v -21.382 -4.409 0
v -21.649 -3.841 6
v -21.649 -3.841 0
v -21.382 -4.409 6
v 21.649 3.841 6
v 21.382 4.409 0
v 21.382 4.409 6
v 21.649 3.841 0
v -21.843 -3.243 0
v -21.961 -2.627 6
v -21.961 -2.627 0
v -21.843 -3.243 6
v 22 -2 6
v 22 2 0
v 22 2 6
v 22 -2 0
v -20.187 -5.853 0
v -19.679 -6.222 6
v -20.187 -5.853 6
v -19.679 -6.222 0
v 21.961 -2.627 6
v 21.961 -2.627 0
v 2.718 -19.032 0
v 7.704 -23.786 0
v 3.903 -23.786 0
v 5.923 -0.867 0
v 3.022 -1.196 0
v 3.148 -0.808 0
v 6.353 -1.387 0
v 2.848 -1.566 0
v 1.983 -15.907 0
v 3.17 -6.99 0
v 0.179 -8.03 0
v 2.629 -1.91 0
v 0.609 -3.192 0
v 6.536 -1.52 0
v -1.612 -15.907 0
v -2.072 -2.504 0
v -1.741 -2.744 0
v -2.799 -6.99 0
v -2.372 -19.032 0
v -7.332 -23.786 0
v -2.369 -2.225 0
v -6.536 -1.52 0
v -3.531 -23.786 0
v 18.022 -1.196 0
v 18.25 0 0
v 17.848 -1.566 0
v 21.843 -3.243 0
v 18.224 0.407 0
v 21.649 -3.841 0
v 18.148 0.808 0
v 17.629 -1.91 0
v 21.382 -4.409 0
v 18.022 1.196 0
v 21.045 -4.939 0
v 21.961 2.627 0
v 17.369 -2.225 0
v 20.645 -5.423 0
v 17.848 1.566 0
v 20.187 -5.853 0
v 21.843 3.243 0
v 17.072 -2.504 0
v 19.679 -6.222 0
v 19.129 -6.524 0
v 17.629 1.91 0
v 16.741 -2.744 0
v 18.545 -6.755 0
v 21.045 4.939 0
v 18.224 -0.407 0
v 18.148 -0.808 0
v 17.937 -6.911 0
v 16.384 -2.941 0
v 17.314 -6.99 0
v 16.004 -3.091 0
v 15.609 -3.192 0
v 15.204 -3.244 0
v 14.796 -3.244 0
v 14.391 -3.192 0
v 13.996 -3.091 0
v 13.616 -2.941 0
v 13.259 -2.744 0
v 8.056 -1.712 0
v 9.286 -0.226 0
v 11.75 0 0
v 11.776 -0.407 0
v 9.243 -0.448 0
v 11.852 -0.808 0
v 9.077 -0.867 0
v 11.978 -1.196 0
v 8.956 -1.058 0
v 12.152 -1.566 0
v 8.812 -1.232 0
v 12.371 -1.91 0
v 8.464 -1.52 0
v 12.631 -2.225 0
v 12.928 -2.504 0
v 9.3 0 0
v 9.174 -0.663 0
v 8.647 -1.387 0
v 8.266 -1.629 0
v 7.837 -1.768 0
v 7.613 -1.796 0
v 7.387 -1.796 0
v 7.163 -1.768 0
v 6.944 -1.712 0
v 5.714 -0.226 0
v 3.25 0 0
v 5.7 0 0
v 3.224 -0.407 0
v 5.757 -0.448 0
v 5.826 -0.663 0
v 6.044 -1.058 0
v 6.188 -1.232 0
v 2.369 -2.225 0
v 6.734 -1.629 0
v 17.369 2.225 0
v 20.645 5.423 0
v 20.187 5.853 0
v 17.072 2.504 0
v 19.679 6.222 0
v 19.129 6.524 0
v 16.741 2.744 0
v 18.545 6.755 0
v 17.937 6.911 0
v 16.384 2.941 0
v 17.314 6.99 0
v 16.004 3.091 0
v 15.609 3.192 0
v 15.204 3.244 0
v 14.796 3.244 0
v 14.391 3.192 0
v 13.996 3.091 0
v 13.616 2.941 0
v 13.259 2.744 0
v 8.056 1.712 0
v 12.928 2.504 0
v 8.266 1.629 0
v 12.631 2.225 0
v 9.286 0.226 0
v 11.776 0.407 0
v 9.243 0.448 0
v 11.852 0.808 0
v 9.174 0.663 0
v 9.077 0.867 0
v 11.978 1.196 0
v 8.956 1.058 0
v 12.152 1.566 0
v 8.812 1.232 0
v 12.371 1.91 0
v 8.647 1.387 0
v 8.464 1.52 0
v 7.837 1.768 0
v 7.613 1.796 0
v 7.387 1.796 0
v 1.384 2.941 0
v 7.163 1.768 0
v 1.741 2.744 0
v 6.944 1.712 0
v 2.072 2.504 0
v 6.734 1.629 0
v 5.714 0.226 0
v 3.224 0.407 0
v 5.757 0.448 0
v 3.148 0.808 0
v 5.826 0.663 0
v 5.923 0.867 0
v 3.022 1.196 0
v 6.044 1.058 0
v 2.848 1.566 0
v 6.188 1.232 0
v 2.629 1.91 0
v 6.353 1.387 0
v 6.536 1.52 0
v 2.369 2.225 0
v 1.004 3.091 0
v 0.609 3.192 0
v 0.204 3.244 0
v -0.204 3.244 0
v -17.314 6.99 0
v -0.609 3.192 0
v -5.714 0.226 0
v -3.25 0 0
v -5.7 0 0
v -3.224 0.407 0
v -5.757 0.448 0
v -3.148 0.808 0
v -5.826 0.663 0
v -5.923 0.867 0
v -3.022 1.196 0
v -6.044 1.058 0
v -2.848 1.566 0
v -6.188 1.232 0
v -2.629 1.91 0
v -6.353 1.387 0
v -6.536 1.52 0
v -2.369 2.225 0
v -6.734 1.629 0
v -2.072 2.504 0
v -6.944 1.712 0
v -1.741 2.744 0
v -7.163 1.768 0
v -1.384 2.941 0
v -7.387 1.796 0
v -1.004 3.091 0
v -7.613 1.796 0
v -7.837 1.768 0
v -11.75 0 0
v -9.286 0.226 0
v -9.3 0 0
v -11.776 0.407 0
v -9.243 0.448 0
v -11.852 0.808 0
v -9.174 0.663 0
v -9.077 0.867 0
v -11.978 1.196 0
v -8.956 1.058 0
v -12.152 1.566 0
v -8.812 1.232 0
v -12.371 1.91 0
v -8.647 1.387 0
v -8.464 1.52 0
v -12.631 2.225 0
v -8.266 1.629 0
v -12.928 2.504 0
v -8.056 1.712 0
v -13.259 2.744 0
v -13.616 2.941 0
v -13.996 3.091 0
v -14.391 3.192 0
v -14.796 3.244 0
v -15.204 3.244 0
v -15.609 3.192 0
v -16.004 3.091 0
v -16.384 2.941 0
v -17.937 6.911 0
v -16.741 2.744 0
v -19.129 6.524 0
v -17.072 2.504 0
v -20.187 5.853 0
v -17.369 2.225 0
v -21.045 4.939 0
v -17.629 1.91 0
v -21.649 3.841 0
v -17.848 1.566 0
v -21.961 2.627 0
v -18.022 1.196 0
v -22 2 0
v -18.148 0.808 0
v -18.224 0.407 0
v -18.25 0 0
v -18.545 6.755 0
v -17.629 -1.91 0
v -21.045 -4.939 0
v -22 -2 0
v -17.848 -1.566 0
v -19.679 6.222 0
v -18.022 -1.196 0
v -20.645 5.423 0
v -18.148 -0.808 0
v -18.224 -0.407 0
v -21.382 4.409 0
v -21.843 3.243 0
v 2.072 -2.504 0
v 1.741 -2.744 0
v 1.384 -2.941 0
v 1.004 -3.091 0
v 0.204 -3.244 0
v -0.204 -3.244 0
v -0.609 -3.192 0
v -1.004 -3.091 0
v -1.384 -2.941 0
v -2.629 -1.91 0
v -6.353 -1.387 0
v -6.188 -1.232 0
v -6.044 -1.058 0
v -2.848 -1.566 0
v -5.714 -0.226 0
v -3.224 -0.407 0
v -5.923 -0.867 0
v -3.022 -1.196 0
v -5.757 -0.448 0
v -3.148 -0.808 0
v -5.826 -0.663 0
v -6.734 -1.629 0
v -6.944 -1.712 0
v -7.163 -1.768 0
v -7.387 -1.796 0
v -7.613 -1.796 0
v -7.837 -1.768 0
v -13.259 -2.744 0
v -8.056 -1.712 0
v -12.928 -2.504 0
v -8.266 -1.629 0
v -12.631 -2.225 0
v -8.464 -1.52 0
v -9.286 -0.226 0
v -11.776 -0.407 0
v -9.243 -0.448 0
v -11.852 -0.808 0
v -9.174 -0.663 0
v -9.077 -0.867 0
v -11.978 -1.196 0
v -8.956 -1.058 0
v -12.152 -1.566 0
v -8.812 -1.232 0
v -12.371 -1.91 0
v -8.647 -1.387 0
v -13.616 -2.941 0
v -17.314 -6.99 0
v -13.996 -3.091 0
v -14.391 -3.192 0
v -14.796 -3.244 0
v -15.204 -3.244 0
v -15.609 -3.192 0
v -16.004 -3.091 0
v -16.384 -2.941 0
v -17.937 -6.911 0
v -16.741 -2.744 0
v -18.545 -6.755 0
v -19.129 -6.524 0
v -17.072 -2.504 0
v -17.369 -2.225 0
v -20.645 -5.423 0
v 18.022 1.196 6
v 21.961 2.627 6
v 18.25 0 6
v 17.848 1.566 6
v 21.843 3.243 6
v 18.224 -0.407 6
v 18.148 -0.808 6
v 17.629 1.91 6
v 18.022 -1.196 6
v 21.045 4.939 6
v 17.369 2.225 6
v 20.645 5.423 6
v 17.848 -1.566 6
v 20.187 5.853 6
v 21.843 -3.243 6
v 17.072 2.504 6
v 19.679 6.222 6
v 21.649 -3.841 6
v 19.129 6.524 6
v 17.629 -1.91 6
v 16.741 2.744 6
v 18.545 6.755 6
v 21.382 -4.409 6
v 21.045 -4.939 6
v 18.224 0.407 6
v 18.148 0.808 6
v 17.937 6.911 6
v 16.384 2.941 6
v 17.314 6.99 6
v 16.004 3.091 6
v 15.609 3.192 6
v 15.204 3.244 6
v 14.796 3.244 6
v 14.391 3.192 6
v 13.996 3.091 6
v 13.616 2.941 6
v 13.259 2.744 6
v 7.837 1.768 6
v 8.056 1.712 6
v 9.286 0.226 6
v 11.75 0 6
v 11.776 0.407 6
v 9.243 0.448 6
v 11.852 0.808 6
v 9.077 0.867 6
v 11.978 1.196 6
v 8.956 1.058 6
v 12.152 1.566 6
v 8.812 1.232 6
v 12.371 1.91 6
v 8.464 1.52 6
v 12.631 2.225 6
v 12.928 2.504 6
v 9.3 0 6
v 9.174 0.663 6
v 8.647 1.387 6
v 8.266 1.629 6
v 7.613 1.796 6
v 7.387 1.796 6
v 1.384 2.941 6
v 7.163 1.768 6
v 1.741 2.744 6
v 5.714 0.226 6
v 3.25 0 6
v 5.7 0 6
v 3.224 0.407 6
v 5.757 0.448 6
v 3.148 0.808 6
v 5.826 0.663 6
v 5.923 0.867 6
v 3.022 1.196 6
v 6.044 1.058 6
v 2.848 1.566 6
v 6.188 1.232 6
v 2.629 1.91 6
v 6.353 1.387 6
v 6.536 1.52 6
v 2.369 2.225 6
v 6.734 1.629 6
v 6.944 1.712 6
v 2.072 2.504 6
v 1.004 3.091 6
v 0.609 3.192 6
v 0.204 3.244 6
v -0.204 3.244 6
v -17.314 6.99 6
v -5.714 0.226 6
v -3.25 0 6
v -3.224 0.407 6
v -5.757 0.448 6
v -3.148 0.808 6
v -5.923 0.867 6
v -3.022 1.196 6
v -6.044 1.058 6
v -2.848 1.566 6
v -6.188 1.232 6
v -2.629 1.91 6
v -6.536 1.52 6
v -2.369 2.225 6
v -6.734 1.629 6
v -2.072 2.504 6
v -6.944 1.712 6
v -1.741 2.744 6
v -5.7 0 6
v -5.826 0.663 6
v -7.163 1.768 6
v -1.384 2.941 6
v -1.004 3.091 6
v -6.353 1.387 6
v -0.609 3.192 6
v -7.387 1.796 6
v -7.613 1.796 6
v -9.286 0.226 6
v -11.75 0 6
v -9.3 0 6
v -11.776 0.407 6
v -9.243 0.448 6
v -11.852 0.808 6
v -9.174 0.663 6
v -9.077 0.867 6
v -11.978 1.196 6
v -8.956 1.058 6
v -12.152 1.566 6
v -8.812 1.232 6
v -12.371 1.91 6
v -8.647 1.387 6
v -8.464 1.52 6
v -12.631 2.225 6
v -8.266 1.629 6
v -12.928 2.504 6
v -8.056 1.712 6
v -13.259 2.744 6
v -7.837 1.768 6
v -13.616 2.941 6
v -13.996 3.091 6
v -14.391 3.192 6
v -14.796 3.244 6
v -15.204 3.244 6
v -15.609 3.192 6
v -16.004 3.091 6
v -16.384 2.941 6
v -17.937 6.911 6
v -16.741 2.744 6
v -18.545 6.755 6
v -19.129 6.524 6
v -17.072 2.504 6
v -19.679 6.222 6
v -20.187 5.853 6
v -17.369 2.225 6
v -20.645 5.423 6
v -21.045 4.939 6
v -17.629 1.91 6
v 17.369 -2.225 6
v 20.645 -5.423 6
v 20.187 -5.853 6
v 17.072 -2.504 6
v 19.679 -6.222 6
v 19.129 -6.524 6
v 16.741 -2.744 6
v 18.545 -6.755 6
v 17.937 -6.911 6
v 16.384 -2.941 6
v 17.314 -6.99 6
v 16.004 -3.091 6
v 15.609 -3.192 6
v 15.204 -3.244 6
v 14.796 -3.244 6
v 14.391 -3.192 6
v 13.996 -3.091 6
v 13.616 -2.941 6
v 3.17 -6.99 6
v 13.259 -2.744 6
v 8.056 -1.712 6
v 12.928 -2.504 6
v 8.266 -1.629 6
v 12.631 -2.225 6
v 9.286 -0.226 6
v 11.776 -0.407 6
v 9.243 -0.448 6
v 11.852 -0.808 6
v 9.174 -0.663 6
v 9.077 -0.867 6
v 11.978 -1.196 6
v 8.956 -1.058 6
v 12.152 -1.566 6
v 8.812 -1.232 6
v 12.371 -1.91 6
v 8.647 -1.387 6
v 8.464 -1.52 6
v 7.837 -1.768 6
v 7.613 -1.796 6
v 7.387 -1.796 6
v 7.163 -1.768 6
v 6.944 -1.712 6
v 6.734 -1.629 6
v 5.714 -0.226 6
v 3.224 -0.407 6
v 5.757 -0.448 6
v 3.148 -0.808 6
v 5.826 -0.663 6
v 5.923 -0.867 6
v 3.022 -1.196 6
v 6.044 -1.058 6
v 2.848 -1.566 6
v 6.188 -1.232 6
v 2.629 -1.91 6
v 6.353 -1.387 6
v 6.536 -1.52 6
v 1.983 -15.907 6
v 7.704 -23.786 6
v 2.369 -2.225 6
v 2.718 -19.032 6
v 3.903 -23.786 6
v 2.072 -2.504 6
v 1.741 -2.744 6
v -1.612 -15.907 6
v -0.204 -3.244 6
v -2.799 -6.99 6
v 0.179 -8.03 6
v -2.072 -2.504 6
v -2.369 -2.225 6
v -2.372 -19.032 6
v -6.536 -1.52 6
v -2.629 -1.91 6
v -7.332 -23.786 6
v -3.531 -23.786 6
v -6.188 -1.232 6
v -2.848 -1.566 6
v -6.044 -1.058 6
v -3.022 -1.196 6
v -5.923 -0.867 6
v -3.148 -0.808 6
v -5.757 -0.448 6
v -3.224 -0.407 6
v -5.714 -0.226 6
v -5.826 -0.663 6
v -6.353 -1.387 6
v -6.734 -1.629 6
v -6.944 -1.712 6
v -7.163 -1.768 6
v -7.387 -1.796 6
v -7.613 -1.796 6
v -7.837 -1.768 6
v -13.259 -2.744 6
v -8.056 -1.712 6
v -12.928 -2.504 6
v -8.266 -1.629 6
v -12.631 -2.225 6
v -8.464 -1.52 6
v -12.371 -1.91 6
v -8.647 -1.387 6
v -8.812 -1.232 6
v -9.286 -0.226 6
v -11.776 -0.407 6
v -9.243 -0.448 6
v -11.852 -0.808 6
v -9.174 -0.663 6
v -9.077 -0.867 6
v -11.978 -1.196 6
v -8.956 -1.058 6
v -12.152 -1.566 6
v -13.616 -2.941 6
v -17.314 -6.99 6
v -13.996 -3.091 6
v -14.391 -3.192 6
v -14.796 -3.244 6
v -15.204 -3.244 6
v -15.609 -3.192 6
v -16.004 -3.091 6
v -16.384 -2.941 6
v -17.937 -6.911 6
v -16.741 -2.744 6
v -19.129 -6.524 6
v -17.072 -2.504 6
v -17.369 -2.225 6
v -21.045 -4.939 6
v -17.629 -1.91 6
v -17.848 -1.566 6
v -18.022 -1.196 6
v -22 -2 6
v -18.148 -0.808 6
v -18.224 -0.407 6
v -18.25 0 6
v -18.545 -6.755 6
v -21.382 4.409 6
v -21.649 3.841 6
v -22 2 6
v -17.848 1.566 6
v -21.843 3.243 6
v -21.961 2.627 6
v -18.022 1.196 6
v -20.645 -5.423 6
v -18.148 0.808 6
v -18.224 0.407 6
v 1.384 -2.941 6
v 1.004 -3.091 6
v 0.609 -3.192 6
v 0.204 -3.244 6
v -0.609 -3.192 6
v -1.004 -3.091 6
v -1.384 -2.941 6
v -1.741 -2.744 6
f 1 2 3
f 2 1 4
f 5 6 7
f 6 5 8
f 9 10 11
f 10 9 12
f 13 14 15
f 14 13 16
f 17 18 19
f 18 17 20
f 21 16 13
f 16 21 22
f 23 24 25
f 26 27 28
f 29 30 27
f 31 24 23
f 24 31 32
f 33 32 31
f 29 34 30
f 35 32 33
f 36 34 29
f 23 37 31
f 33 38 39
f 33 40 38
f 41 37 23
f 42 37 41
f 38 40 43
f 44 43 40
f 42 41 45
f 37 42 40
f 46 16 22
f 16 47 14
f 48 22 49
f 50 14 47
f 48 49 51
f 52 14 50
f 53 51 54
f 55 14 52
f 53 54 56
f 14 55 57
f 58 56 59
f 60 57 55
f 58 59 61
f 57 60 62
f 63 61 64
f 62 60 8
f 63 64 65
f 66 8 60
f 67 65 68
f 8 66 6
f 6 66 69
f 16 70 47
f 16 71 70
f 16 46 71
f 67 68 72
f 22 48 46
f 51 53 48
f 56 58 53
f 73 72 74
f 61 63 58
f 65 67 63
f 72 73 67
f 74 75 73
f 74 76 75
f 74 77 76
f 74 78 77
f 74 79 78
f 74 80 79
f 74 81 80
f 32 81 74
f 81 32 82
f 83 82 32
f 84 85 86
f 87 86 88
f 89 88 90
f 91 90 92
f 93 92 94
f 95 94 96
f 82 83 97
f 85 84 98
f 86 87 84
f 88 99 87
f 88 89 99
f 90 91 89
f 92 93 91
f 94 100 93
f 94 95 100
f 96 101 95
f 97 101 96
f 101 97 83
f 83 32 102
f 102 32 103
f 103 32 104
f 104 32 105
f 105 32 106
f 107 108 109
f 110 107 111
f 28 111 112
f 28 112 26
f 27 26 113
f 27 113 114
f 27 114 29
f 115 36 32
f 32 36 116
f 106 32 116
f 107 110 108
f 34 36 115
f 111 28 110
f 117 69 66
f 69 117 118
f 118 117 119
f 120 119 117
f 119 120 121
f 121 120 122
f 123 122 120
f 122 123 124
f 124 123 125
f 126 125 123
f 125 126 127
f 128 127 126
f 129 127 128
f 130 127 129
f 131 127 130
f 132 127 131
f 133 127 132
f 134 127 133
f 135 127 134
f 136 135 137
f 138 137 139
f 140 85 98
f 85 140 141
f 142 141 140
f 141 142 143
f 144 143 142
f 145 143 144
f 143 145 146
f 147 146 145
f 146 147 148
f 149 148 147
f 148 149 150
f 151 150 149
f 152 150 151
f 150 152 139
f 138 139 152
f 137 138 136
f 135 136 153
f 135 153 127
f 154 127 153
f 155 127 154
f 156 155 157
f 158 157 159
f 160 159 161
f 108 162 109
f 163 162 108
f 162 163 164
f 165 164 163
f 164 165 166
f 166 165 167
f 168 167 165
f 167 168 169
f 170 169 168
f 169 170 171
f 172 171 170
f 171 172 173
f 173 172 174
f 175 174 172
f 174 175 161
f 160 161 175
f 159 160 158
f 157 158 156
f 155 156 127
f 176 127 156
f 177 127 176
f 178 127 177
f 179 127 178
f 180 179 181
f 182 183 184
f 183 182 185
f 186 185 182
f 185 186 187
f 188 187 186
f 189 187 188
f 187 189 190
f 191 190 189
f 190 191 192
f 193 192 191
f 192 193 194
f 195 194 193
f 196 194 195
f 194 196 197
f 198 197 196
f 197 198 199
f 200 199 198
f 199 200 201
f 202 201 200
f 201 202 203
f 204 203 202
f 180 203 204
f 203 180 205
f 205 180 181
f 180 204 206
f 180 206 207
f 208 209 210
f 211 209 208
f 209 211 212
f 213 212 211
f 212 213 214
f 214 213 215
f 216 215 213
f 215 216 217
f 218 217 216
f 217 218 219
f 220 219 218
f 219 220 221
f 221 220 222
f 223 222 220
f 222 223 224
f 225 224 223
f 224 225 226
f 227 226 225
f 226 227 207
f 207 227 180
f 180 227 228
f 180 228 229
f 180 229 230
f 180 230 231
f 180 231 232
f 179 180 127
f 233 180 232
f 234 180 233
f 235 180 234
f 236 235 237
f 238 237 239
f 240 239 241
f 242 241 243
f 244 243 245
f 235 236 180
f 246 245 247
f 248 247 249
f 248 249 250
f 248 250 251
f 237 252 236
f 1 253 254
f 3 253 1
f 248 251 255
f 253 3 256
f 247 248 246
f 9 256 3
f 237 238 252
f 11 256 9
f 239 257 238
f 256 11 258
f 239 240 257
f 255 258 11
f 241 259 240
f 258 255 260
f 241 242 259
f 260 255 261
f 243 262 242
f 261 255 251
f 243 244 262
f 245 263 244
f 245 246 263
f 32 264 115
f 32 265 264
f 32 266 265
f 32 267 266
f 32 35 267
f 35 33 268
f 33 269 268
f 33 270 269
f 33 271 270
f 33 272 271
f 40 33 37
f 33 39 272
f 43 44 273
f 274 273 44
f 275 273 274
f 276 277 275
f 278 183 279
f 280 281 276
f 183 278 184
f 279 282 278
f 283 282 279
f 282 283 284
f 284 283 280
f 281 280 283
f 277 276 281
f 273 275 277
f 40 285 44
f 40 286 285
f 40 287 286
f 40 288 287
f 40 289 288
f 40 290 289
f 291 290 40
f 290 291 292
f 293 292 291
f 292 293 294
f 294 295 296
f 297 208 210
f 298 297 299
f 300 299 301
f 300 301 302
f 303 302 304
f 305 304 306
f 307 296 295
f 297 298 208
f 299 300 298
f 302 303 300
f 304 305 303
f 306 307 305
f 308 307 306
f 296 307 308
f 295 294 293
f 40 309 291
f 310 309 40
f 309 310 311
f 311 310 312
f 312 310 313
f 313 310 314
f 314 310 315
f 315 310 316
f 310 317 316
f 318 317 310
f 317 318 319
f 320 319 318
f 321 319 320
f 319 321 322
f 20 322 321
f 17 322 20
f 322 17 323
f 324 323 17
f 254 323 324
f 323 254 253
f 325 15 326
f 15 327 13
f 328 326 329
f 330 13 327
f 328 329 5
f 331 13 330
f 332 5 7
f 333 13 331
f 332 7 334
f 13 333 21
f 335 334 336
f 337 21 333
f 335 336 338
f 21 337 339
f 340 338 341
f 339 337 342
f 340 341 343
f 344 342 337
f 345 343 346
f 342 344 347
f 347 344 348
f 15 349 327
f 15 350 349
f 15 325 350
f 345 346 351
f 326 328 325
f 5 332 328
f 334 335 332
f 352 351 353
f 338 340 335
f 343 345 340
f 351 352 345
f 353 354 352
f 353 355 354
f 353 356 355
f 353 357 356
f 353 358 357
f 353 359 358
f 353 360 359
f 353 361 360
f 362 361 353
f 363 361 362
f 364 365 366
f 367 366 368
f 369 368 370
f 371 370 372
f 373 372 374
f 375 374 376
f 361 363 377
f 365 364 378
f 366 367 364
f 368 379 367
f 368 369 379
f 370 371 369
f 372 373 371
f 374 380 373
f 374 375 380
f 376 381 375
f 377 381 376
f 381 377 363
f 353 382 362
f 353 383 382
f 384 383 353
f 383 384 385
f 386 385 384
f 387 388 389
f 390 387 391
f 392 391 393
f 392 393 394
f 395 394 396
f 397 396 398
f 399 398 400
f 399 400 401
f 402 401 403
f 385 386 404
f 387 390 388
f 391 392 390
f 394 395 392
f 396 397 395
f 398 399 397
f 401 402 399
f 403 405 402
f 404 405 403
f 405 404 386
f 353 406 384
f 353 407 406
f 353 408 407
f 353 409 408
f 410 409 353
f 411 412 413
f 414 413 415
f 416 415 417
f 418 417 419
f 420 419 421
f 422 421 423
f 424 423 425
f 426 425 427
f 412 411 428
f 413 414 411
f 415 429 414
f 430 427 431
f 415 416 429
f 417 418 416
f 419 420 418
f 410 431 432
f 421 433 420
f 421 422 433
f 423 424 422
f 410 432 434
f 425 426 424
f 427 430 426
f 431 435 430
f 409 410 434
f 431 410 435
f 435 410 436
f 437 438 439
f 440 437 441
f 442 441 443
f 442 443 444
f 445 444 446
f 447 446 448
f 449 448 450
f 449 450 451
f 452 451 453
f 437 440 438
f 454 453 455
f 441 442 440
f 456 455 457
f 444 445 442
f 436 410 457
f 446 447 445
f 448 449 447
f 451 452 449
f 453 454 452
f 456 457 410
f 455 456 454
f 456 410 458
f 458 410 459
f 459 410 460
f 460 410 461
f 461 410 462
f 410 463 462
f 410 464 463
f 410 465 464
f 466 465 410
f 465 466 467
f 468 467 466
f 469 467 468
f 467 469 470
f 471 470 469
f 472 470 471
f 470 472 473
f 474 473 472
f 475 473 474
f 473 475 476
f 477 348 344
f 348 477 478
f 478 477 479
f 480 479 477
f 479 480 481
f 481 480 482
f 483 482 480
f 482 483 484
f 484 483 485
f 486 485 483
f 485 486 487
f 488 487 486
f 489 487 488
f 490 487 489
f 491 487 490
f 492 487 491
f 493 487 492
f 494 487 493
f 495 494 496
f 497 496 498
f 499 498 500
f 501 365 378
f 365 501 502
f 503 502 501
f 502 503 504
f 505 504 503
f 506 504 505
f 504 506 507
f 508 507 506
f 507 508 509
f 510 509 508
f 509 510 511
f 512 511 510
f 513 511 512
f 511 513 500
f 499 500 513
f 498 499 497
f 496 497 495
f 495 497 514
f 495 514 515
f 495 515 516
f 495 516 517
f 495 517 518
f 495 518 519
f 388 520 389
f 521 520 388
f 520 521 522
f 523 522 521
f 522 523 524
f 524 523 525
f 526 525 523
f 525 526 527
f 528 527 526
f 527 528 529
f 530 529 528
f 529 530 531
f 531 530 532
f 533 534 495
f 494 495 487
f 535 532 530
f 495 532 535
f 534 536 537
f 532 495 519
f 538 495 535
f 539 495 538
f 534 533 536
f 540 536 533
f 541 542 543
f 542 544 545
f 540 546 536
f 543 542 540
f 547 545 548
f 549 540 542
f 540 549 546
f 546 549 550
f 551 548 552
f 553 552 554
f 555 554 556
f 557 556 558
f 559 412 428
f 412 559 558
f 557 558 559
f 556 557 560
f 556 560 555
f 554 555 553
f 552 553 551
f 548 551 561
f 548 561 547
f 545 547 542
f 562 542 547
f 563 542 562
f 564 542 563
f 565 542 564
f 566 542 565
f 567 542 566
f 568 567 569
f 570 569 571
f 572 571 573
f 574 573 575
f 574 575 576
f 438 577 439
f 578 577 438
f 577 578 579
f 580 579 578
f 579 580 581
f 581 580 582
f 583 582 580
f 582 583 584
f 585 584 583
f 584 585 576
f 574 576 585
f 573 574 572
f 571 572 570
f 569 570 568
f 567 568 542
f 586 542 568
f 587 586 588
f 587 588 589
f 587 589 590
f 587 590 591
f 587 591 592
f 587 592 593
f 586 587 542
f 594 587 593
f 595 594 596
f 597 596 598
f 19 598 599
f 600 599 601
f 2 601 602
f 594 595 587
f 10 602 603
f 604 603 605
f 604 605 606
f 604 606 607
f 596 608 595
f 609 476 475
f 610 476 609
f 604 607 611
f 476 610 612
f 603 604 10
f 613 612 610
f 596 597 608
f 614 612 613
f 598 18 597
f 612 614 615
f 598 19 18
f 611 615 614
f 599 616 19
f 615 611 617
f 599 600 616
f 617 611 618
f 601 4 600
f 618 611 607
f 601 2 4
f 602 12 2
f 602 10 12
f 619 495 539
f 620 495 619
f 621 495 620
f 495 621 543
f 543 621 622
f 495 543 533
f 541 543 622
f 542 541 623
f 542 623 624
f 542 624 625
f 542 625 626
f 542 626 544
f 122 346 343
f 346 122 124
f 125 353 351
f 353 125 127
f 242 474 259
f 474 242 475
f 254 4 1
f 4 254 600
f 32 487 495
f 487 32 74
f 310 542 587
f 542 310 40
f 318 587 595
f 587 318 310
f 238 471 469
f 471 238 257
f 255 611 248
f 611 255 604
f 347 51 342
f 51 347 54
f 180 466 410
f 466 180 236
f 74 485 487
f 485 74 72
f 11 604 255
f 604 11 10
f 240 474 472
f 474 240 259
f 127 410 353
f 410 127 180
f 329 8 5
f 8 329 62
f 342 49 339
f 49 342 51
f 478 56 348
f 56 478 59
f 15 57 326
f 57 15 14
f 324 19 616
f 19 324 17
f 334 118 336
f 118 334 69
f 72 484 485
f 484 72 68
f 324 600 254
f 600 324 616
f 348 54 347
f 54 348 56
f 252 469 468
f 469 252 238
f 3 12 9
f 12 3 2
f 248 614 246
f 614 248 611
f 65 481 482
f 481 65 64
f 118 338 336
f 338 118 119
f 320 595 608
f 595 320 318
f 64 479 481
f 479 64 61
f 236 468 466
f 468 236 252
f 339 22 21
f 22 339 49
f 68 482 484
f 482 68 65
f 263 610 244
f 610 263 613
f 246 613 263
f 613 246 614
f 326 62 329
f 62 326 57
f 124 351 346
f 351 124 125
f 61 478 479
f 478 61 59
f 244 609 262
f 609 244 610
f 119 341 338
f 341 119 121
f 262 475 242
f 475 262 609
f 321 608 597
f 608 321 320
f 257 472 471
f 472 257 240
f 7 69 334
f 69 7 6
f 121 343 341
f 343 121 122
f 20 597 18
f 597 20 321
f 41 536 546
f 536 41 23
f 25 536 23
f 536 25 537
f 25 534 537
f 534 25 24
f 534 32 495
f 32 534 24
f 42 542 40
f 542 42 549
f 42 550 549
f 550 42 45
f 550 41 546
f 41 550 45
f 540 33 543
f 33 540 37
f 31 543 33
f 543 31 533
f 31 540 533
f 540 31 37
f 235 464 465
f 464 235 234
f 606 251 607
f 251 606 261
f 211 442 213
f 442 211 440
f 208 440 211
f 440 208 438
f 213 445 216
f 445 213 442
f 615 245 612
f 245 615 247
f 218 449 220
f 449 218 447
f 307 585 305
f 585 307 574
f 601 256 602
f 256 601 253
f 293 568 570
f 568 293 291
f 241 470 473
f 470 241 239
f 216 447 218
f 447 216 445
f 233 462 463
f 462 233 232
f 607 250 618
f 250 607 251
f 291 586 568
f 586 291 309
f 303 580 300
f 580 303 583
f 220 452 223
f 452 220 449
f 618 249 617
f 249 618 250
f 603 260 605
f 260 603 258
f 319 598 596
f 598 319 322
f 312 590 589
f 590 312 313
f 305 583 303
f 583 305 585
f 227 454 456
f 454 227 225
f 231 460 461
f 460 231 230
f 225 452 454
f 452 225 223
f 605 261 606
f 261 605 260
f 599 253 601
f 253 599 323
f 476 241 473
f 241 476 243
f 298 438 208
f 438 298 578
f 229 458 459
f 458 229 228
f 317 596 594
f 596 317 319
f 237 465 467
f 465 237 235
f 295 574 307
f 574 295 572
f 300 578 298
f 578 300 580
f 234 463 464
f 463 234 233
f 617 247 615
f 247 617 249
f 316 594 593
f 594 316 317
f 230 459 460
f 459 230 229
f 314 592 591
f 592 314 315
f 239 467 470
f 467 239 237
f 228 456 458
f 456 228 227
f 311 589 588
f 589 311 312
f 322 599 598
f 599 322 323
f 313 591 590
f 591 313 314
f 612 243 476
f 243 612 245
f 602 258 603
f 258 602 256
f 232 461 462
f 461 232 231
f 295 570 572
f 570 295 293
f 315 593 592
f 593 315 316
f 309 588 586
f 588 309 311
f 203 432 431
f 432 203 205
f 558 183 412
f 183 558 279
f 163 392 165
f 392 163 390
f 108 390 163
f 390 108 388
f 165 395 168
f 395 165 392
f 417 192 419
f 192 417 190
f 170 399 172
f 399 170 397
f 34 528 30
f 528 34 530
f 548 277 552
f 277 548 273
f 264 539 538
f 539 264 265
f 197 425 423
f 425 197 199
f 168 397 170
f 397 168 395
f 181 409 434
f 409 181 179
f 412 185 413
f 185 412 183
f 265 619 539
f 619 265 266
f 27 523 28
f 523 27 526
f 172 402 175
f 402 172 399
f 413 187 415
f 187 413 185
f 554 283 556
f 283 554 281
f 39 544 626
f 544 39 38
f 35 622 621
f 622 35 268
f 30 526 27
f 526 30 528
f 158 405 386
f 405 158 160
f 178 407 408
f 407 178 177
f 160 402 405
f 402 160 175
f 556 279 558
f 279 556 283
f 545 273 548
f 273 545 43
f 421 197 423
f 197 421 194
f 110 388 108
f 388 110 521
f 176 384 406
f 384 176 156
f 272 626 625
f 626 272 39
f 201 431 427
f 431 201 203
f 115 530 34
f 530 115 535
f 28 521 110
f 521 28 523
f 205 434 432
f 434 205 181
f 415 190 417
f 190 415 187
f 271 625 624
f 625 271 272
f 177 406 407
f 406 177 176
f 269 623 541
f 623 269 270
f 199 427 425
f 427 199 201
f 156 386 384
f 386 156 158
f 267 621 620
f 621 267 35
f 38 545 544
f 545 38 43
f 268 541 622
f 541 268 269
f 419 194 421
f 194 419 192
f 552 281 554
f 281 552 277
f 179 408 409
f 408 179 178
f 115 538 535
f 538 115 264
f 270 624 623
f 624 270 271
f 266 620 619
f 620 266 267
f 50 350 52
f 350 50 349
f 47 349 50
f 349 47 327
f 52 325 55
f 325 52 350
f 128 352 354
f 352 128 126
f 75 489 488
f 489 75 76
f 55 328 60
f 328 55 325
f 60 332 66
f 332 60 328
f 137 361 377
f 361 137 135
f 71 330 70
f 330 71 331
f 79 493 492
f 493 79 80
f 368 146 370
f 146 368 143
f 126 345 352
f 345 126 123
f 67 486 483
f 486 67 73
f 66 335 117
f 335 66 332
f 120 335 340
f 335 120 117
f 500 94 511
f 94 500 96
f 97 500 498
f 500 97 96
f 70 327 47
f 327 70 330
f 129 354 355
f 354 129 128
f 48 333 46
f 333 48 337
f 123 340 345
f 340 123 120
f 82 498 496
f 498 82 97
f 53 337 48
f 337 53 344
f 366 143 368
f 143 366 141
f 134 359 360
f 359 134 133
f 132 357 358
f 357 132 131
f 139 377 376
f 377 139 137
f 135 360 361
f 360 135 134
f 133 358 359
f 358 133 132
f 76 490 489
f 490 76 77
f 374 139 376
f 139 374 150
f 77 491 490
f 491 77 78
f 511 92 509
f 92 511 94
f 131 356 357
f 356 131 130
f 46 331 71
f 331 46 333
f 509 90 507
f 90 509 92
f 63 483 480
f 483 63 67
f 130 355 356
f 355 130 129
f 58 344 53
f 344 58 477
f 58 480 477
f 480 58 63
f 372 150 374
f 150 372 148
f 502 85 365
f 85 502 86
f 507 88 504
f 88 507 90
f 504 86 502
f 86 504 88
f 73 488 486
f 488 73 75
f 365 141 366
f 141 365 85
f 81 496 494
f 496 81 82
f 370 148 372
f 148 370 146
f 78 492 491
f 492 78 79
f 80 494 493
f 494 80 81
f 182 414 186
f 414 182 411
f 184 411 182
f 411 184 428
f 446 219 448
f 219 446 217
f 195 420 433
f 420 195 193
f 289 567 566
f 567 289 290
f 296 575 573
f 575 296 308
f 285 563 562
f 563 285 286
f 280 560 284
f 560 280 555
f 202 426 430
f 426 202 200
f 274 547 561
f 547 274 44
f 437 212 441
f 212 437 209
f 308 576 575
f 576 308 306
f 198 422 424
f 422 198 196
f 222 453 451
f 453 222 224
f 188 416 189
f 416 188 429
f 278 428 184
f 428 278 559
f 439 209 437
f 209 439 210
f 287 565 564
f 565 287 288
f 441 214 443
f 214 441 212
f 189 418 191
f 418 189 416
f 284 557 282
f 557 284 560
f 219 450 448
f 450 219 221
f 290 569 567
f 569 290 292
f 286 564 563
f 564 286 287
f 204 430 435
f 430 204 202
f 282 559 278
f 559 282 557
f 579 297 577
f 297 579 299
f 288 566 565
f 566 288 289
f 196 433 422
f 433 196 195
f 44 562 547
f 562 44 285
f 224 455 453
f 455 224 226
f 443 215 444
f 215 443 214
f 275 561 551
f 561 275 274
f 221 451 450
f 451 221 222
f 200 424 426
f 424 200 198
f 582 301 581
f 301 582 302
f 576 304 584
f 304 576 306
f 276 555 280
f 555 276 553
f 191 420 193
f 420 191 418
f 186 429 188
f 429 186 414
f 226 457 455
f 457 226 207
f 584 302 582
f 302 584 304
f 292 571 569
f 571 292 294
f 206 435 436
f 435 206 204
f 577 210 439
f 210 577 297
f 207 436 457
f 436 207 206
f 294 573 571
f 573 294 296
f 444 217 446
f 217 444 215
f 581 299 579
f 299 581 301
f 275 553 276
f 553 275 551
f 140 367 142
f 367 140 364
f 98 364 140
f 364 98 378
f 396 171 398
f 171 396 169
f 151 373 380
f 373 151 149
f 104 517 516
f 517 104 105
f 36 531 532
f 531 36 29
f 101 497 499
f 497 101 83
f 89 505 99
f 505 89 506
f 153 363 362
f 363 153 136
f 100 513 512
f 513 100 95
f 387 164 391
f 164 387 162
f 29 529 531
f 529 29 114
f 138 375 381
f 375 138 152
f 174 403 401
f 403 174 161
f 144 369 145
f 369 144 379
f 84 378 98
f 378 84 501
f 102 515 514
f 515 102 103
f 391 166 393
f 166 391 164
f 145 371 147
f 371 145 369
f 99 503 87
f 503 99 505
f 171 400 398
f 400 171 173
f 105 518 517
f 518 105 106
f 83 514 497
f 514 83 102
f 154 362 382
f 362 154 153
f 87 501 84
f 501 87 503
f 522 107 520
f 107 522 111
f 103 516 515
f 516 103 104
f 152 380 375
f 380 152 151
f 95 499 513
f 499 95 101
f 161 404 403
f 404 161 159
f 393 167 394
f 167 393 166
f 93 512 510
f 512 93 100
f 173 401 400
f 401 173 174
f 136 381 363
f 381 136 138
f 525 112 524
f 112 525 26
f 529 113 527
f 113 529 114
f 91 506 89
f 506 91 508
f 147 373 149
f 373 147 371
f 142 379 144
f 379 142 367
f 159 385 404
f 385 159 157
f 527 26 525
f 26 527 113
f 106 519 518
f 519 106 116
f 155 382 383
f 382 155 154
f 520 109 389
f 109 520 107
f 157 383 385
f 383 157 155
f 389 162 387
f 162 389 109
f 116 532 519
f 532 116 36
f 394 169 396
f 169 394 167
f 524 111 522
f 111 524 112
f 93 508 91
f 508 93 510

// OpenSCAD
$fn = 50;


difference() {
	union() {
		hull() {
			translate(v = [-17.0000000000, 2.0000000000, 0]) {
				cylinder(h = 6, r = 5);
			}
			translate(v = [17.0000000000, 2.0000000000, 0]) {
				cylinder(h = 6, r = 5);
			}
			translate(v = [-17.0000000000, -2.0000000000, 0]) {
				cylinder(h = 6, r = 5);
			}
			translate(v = [17.0000000000, -2.0000000000, 0]) {
				cylinder(h = 6, r = 5);
			}
		}
		translate(v = [0, -5, 0]) {
			linear_extrude(height = 6) {
				text(font = "DejaVu Sans Mono:style=Bold", halign = "center", size = 19.0000000000, text = "A", valign = "top");
			}
		}
	}
	union() {
		translate(v = [-15.0000000000, 0.0000000000, 0]) {
			translate(v = [0, 0, -100]) {
				cylinder(h = 200, r = 3.2500000000);
			}
		}
		translate(v = [0, 0, -100]) {
			cylinder(h = 200, r = 3.2500000000);
		}
		translate(v = [15.0000000000, 0.0000000000, 0]) {
			translate(v = [0, 0, -100]) {
				cylinder(h = 200, r = 3.2500000000);
			}
		}
		translate(v = [-15.0000000000, 0.0000000000, 0]) {
			translate(v = [0, 0, -100]) {
				cylinder(h = 200, r = 1.8000000000);
			}
		}
		translate(v = [-7.5000000000, 0.0000000000, 0]) {
			translate(v = [0, 0, -100]) {
				cylinder(h = 200, r = 1.8000000000);
			}
		}
		translate(v = [0, 0, -100]) {
			cylinder(h = 200, r = 1.8000000000);
		}
		translate(v = [7.5000000000, 0.0000000000, 0]) {
			translate(v = [0, 0, -100]) {
				cylinder(h = 200, r = 1.8000000000);
			}
		}
		translate(v = [15.0000000000, 0.0000000000, 0]) {
			translate(v = [0, 0, -100]) {
				cylinder(h = 200, r = 1.8000000000);
			}
		}
	}
}
